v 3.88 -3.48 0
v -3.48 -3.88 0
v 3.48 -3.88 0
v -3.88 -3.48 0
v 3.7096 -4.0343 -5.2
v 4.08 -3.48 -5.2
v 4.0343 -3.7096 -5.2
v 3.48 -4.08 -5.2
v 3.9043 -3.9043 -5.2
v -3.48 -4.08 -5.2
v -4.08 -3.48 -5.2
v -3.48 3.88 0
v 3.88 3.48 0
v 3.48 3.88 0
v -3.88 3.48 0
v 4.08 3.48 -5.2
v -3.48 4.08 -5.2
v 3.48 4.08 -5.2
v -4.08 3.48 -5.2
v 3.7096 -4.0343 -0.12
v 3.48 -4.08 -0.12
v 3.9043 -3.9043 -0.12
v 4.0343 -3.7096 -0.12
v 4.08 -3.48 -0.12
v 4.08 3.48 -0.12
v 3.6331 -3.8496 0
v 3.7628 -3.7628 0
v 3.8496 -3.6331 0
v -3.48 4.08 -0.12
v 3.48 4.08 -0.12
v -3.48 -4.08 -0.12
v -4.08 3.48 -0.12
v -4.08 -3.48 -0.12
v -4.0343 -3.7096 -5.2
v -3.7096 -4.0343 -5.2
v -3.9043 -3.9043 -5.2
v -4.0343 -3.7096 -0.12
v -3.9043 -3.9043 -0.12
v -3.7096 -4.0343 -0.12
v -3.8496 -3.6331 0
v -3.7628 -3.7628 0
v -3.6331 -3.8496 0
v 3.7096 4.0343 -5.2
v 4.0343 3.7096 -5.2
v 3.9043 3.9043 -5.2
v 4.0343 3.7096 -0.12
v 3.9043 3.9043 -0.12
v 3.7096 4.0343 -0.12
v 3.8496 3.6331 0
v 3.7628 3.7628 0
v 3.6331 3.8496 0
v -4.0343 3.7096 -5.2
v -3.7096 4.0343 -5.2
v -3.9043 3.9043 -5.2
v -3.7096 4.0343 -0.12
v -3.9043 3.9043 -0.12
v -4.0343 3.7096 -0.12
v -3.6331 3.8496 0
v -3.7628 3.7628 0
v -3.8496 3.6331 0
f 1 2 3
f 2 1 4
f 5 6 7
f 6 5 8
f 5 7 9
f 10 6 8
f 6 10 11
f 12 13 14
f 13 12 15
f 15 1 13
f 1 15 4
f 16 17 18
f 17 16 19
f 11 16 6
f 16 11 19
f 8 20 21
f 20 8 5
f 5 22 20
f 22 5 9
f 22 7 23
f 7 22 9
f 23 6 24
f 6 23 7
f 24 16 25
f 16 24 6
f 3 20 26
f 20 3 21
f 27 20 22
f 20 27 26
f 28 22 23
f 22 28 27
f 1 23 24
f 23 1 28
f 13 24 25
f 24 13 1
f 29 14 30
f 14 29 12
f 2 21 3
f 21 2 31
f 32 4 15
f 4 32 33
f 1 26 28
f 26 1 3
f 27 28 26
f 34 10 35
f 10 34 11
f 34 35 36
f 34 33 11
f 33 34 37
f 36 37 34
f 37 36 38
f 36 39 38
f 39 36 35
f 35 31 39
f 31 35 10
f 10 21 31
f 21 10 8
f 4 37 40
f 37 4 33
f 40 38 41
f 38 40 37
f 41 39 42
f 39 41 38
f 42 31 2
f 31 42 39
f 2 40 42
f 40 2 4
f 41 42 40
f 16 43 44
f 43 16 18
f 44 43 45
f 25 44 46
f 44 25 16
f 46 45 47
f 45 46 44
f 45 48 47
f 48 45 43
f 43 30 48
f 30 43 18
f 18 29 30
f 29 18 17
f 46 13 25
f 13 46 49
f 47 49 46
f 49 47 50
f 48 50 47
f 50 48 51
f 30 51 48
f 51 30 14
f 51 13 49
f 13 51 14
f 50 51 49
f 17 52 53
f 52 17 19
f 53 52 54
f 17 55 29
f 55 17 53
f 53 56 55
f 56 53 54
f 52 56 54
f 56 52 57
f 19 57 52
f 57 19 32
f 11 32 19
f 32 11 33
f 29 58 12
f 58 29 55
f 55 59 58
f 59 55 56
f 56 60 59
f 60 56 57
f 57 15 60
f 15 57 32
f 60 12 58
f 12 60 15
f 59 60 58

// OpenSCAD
// file: ../p/1-4cyli.scad
use <../lib.scad>
function ldraw_lib__1_4cyli() = [
// 0 Cylinder 0.25
// 0 Name: 1-4cyli.dat
// 0 Author: James Jessiman
// 0 !LDRAW_ORG Primitive UPDATE 2012-01
// 0 !LICENSE Licensed under CC BY 4.0 : see CAreadme.txt
// 
// 0 BFC CERTIFY CCW
  [0,"BFC","CERTIFY"],
  [0,"BFC","CCW"],
// 
// 0 !HISTORY 2002-03-23 [sbliss] Added BFC statement.
// 0 !HISTORY 2002-04-25 [PTadmin] Official Update 2002-02
// 0 !HISTORY 2007-06-22 [PTadmin] Header formatted for Contributor Agreement
// 0 !HISTORY 2008-07-01 [PTadmin] Official Update 2008-01
// 0 !HISTORY 2012-02-16 [Philo] Changed to CCW
// 0 !HISTORY 2012-03-30 [PTadmin] Official Update 2012-01
// 
// 
// 4 16 1 1 0 0.9239 1 0.3827 0.9239 0 0.3827 1 0 0
  [4,16,1,1,0,0.9239,1,0.3827,0.9239,0,0.3827,1,0,0],
// 5 24 1 0 0 1 1 0 0.9239 0 0.3827 1 0 -1
  [5,24,1,0,0,1,1,0,0.9239,0,0.3827,1,0,-1],
// 4 16 0.9239 1 0.3827 0.7071 1 0.7071 0.7071 0 0.7071 0.9239 0 0.3827
  [4,16,0.9239,1,0.3827,0.7071,1,0.7071,0.7071,0,0.7071,0.9239,0,0.3827],
// 5 24 0.9239 0 0.3827 0.9239 1 0.3827 0.7071 0 0.7071 1 0 0
  [5,24,0.9239,0,0.3827,0.9239,1,0.3827,0.7071,0,0.7071,1,0,0],
// 4 16 0.7071 1 0.7071 0.3827 1 0.9239 0.3827 0 0.9239 0.7071 0 0.7071
  [4,16,0.7071,1,0.7071,0.3827,1,0.9239,0.3827,0,0.9239,0.7071,0,0.7071],
// 5 24 0.7071 0 0.7071 0.7071 1 0.7071 0.3827 0 0.9239 0.9239 0 0.3827
  [5,24,0.7071,0,0.7071,0.7071,1,0.7071,0.3827,0,0.9239,0.9239,0,0.3827],
// 4 16 0.3827 1 0.9239 0 1 1 0 0 1 0.3827 0 0.9239
  [4,16,0.3827,1,0.9239,0,1,1,0,0,1,0.3827,0,0.9239],
// 5 24 0.3827 0 0.9239 0.3827 1 0.9239 0 0 1 0.7071 0 0.7071
  [5,24,0.3827,0,0.9239,0.3827,1,0.9239,0,0,1,0.7071,0,0.7071],
// 5 24 0 0 1 0 1 1 0.3827 0 0.9239 -1 0 1
  [5,24,0,0,1,0,1,1,0.3827,0,0.9239,-1,0,1],
];
module ldraw_lib__1_4cyli(step=0, col=false, unit=2/5, alt=false, line=0.2, solid=!$preview)
    makepoly(ldraw_lib__1_4cyli(), step=step, col=col, unit=unit, alt=alt, line=line, solid=solid);
ldraw_lib__1_4cyli(line=0.2);
// file: ../p/rect2p.scad
use <../lib.scad>
function ldraw_lib__rect2p() = [
// 0 Rectangle with 2 Parallel Edges
// 0 Name: rect2p.dat
// 0 Author: Donald Sutter [technog]
// 0 !LDRAW_ORG Primitive UPDATE 2010-01
// 0 !LICENSE Licensed under CC BY 4.0 : see CAreadme.txt
// 
// 0 BFC CERTIFY CCW
  [0,"BFC","CERTIFY"],
  [0,"BFC","CCW"],
// 
// 0 !HISTORY 2003-08-01 [PTadmin] Official Update 2003-02
// 0 !HISTORY 2007-06-24 [PTadmin] Header formatted for Contributor Agreement
// 0 !HISTORY 2008-07-01 [PTadmin] Official Update 2008-01
// 0 !HISTORY 2010-01-17 [mikeheide] changed winding to CCW
// 0 !HISTORY 2010-04-05 [PTadmin] Official Update 2010-01
// 
// 
// 2 24 1 0 1 -1 0 1
  [2,24,1,0,1,-1,0,1],
// 2 24 -1 0 -1 1 0 -1
  [2,24,-1,0,-1,1,0,-1],
// 4 16 -1 0 1 -1 0 -1 1 0 -1 1 0 1
  [4,16,-1,0,1,-1,0,-1,1,0,-1,1,0,1],
// 0
];
module ldraw_lib__rect2p(step=0, col=false, unit=2/5, alt=false, line=0.2, solid=!$preview)
    makepoly(ldraw_lib__rect2p(), step=step, col=col, unit=unit, alt=alt, line=line, solid=solid);
ldraw_lib__rect2p(line=0.2);
// file: ../p/rect1.scad
use <../lib.scad>
function ldraw_lib__rect1() = [
// 0 Rectangle with 1 Edge
// 0 Name: rect1.dat
// 0 Author: Chris Dee [cwdee]
// 0 !LDRAW_ORG Primitive UPDATE 2010-01
// 0 !LICENSE Licensed under CC BY 4.0 : see CAreadme.txt
// 
// 0 BFC CERTIFY CCW
  [0,"BFC","CERTIFY"],
  [0,"BFC","CCW"],
// 
// 0 !HISTORY 2003-12-19 [PTadmin] Official Update 2003-03
// 0 !HISTORY 2007-06-24 [PTadmin] Header formatted for Contributor Agreement
// 0 !HISTORY 2008-07-01 [PTadmin] Official Update 2008-01
// 0 !HISTORY 2010-01-17 [mikeheide] changed winding to CCW
// 0 !HISTORY 2010-04-05 [PTadmin] Official Update 2010-01
// 
// 
// 2 24 1 0 -1 1 0 1
  [2,24,1,0,-1,1,0,1],
// 4 16 -1 0 1 -1 0 -1 1 0 -1 1 0 1
  [4,16,-1,0,1,-1,0,-1,1,0,-1,1,0,1],
// 0
];
module ldraw_lib__rect1(step=0, col=false, unit=2/5, alt=false, line=0.2, solid=!$preview)
    makepoly(ldraw_lib__rect1(), step=step, col=col, unit=unit, alt=alt, line=line, solid=solid);
ldraw_lib__rect1(line=0.2);
// file: ../p/1-4edge.scad
use <../lib.scad>
function ldraw_lib__1_4edge() = [
// 0 Circle 0.25
// 0 Name: 1-4edge.dat
// 0 Author: James Jessiman
// 0 !LDRAW_ORG Primitive UPDATE 2017-01
// 0 !LICENSE Licensed under CC BY 4.0 : see CAreadme.txt
// 
// 0 BFC CERTIFY CCW
  [0,"BFC","CERTIFY"],
  [0,"BFC","CCW"],
// 
// 0 !HISTORY 2007-06-22 [PTadmin] Header formatted for Contributor Agreement
// 0 !HISTORY 2008-07-01 [PTadmin] Official Update 2008-01
// 0 !HISTORY 2017-01-15 [Steffen] BFCed
// 0 !HISTORY 2017-12-30 [PTadmin] Official Update 2017-01
// 
// 
// 2 24 1 0 0 0.9239 0 0.3827
  [2,24,1,0,0,0.9239,0,0.3827],
// 2 24 0.9239 0 0.3827 0.7071 0 0.7071
  [2,24,0.9239,0,0.3827,0.7071,0,0.7071],
// 2 24 0.7071 0 0.7071 0.3827 0 0.9239
  [2,24,0.7071,0,0.7071,0.3827,0,0.9239],
// 2 24 0.3827 0 0.9239 0 0 1
  [2,24,0.3827,0,0.9239,0,0,1],
];
module ldraw_lib__1_4edge(step=0, col=false, unit=2/5, alt=false, line=0.2, solid=!$preview)
    makepoly(ldraw_lib__1_4edge(), step=step, col=col, unit=unit, alt=alt, line=line, solid=solid);
ldraw_lib__1_4edge(line=0.2);
// file: ../p/1-4cylo.scad
use <../lib.scad>
use <1-4cyli.scad>
use <1-4edge.scad>
function ldraw_lib__1_4cylo() = [
// 0 Cylinder Open 0.25
// 0 Name: 1-4cylo.dat
// 0 Author: Max Martin Richter [MMR1988]
// 0 !LDRAW_ORG Primitive UPDATE 2010-03
// 0 !LICENSE Licensed under CC BY 4.0 : see CAreadme.txt
// 
// 0 BFC CERTIFY CCW
  [0,"BFC","CERTIFY"],
  [0,"BFC","CCW"],
// 
// 0 !HISTORY 2010-12-31 [PTadmin] Official Update 2010-03
// 
// 
// 1 16 0 0 0 1 0 0 0 1 0 0 0 1 1-4edge.dat
  [1,16,0,0,0,1,0,0,0,1,0,0,0,1, ldraw_lib__1_4edge()],
// 1 16 0 1 0 1 0 0 0 1 0 0 0 1 1-4edge.dat
  [1,16,0,1,0,1,0,0,0,1,0,0,0,1, ldraw_lib__1_4edge()],
// 1 16 0 0 0 1 0 0 0 1 0 0 0 1 1-4cyli.dat
  [1,16,0,0,0,1,0,0,0,1,0,0,0,1, ldraw_lib__1_4cyli()],
];
module ldraw_lib__1_4cylo(step=0, col=false, unit=2/5, alt=false, line=0.2, solid=!$preview)
    makepoly(ldraw_lib__1_4cylo(), step=step, col=col, unit=unit, alt=alt, line=line, solid=solid);
ldraw_lib__1_4cylo(line=0.2);
// file: ../p/1-4con2.scad
use <../lib.scad>
function ldraw_lib__1_4con2() = [
// 0 Cone  2 x 0.25
// 0 Name: 1-4con2.dat
// 0 Author: Steve Bliss [sbliss]
// 0 !LDRAW_ORG Primitive UPDATE 2012-01
// 0 !LICENSE Licensed under CC BY 4.0 : see CAreadme.txt
// 
// 0 BFC CERTIFY CCW
  [0,"BFC","CERTIFY"],
  [0,"BFC","CCW"],
// 
// 0 !HISTORY 1999-07-05 [PTadmin] Official Update 1999-05
// 0 !HISTORY 2002-12-11 [cwdee] Standardised title and made BFC compliant
// 0 !HISTORY 2003-06-28 [pneaster] Added missing conditional line
// 0 !HISTORY 2003-12-19 [PTadmin] Official Update 2003-03
// 0 !HISTORY 2007-06-22 [PTadmin] Header formatted for Contributor Agreement
// 0 !HISTORY 2008-07-01 [PTadmin] Official Update 2008-01
// 0 !HISTORY 2012-02-16 [Philo] Recreated CCW
// 0 !HISTORY 2012-03-30 [PTadmin] Official Update 2012-01
// 
// 
// 4 16 2 1 0 1.8478 1 0.7654 2.7717 0 1.1481 3 0 0
  [4,16,2,1,0,1.8478,1,0.7654,2.7717,0,1.1481,3,0,0],
// 4 16 1.8478 1 0.7654 1.4142 1 1.4142 2.1213 0 2.1213 2.7717 0 1.1481
  [4,16,1.8478,1,0.7654,1.4142,1,1.4142,2.1213,0,2.1213,2.7717,0,1.1481],
// 4 16 1.4142 1 1.4142 0.7654 1 1.8478 1.1481 0 2.7717 2.1213 0 2.1213
  [4,16,1.4142,1,1.4142,0.7654,1,1.8478,1.1481,0,2.7717,2.1213,0,2.1213],
// 4 16 0.7654 1 1.8478 0 1 2 0 0 3 1.1481 0 2.7717
  [4,16,0.7654,1,1.8478,0,1,2,0,0,3,1.1481,0,2.7717],
// 0 // conditional lines
// 5 24 2 1 0 3 0 0 2 1 -0.8284 1.8478 1 0.7654
  [5,24,2,1,0,3,0,0,2,1,-0.8284,1.8478,1,0.7654],
// 5 24 1.8478 1 0.7654 2.7717 0 1.1481 2 1 0 1.4142 1 1.4142
  [5,24,1.8478,1,0.7654,2.7717,0,1.1481,2,1,0,1.4142,1,1.4142],
// 5 24 1.4142 1 1.4142 2.1213 0 2.1213 1.8478 1 0.7654 0.7654 1 1.8478
  [5,24,1.4142,1,1.4142,2.1213,0,2.1213,1.8478,1,0.7654,0.7654,1,1.8478],
// 5 24 0.7654 1 1.8478 1.1481 0 2.7717 1.4142 1 1.4142 0 1 2
  [5,24,0.7654,1,1.8478,1.1481,0,2.7717,1.4142,1,1.4142,0,1,2],
// 5 24 0 1 2 0 0 3 0.7654 1 1.8478 -0.8284 1 2
  [5,24,0,1,2,0,0,3,0.7654,1,1.8478,-0.8284,1,2],
// 0 // Build by Primitive Generator 2
];
module ldraw_lib__1_4con2(step=0, col=false, unit=2/5, alt=false, line=0.2, solid=!$preview)
    makepoly(ldraw_lib__1_4con2(), step=step, col=col, unit=unit, alt=alt, line=line, solid=solid);
ldraw_lib__1_4con2(line=0.2);
// file: ../p/1-4chrd.scad
use <../lib.scad>
function ldraw_lib__1_4chrd() = [
// 0 Chord 0.25
// 0 Name: 1-4chrd.dat
// 0 Author: Tony Hafner [hafhead]
// 0 !LDRAW_ORG Primitive UPDATE 2012-02
// 0 !LICENSE Licensed under CC BY 2.0 and CC BY 4.0 : see CAreadme.txt
// 
// 0 BFC CERTIFY CCW
  [0,"BFC","CERTIFY"],
  [0,"BFC","CCW"],
// 
// 0 !HISTORY 2004-04-22 [PTadmin] Official Update 2004-02
// 0 !HISTORY 2007-10-09 [PTadmin] Header formatted for Contributor Agreement
// 0 !HISTORY 2008-07-01 [PTadmin] Official Update 2008-01
// 0 !HISTORY 2012-08-02 [MMR1988] Re-creation with PrimGen2 and Rectifier
// 0 !HISTORY 2012-08-09 [PTadmin] Official Update 2012-02
// 
// 
// 4 16 0.9239 0 0.3827 0.3827 0 0.9239 0 0 1 1 0 0
  [4,16,0.9239,0,0.3827,0.3827,0,0.9239,0,0,1,1,0,0],
// 3 16 0.7071 0 0.7071 0.3827 0 0.9239 0.9239 0 0.3827
  [3,16,0.7071,0,0.7071,0.3827,0,0.9239,0.9239,0,0.3827],
];
module ldraw_lib__1_4chrd(step=0, col=false, unit=2/5, alt=false, line=0.2, solid=!$preview)
    makepoly(ldraw_lib__1_4chrd(), step=step, col=col, unit=unit, alt=alt, line=line, solid=solid);
ldraw_lib__1_4chrd(line=0.2);
// file: 99146.scad
use <../lib.scad>
use <../p/1-4chrd.scad>
use <../p/1-4con2.scad>
use <../p/1-4cylo.scad>
use <../p/1-4edge.scad>
use <../p/rect1.scad>
use <../p/rect2p.scad>
function ldraw_lib__99146() = [
// 0 ~Electric Mindstorms EV3 Square Button
// 0 Name: 99146.dat
// 0 Author: Philippe Hurbain [Philo]
// 0 !LDRAW_ORG Part UPDATE 2013-02
// 0 !LICENSE Licensed under CC BY 4.0 : see CAreadme.txt
// 
// 0 BFC CERTIFY CCW
  [0,"BFC","CERTIFY"],
  [0,"BFC","CCW"],
// 
// 0 !HISTORY 2012-05-20 {LEGO MINDSTORMS Team} Original part shape
// 0 !HISTORY 2012-06-09 [Philo] Complete rebuild for LDraw Parts Tracker
// 0 !HISTORY 2013-12-23 [PTadmin] Official Update 2013-02
// 
// 
// 4 16 8.7 0 -9.7 9.7 0 -8.7 -9.7 0 -8.7 -8.7 0 -9.7
  [4,16,8.7,0,-9.7,9.7,0,-8.7,-9.7,0,-8.7,-8.7,0,-9.7],
// 1 16 8.7 13 -8.7 0 0 1.5 0 -0.3 0 -1.5 0 0 1-4chrd.dat
  [1,16,8.7,13,-8.7,0,0,1.5,0,-0.3,0,-1.5,0,0, ldraw_lib__1_4chrd()],
// 4 16 -8.7 13 -10.2 -10.2 13 -8.7 10.2 13 -8.7 8.7 13 -10.2
  [4,16,-8.7,13,-10.2,-10.2,13,-8.7,10.2,13,-8.7,8.7,13,-10.2],
// 4 16 -8.7 0 9.7 -9.7 0 8.7 9.7 0 8.7 8.7 0 9.7
  [4,16,-8.7,0,9.7,-9.7,0,8.7,9.7,0,8.7,8.7,0,9.7],
// 1 16 0 0 0 0 0 -9.7 0 1 0 8.7 0 0 rect2p.dat
  [1,16,0,0,0,0,0,-9.7,0,1,0,8.7,0,0, ldraw_lib__rect2p()],
// 4 16 8.7 13 10.2 10.2 13 8.7 -10.2 13 8.7 -8.7 13 10.2
  [4,16,8.7,13,10.2,10.2,13,8.7,-10.2,13,8.7,-8.7,13,10.2],
// 4 16 -10.2 13 -8.7 -10.2 13 8.7 10.2 13 8.7 10.2 13 -8.7
  [4,16,-10.2,13,-8.7,-10.2,13,8.7,10.2,13,8.7,10.2,13,-8.7],
// 1 16 8.7 0.3 -8.7 0 0 1.5 0 12.7 0 -1.5 0 0 1-4cylo.dat
  [1,16,8.7,0.3,-8.7,0,0,1.5,0,12.7,0,-1.5,0,0, ldraw_lib__1_4cylo()],
// 1 16 10.2 6.65 0 0 -1 0 0 0 -6.35 8.7 0 0 rect2p.dat
  [1,16,10.2,6.65,0,0,-1,0,0,0,-6.35,8.7,0,0, ldraw_lib__rect2p()],
// 1 16 8.7 0.3 -8.7 0 0 0.5 0 -0.3 0 -0.5 0 0 1-4con2.dat
  [1,16,8.7,0.3,-8.7,0,0,0.5,0,-0.3,0,-0.5,0,0, ldraw_lib__1_4con2()],
// 1 16 8.7 0 -8.7 0 0 1 0 0.3 0 -1 0 0 1-4edge.dat
  [1,16,8.7,0,-8.7,0,0,1,0,0.3,0,-1,0,0, ldraw_lib__1_4edge()],
// 4 16 9.7 0 -8.7 10.2 0.3 -8.7 10.2 0.3 8.7 9.7 0 8.7
  [4,16,9.7,0,-8.7,10.2,0.3,-8.7,10.2,0.3,8.7,9.7,0,8.7],
// 1 16 0 0.15 9.95 0 0 8.7 -0.15 8.7 0 -0.25 -5.22 0 rect1.dat
  [1,16,0,0.15,9.95,0,0,8.7,-0.15,8.7,0,-0.25,-5.22,0, ldraw_lib__rect1()],
// 1 16 0 0.15 -9.95 0 0 -8.7 -0.15 8.7 0 0.25 5.22 0 rect1.dat
  [1,16,0,0.15,-9.95,0,0,-8.7,-0.15,8.7,0,0.25,5.22,0, ldraw_lib__rect1()],
// 4 16 -9.7 0 8.7 -10.2 0.3 8.7 -10.2 0.3 -8.7 -9.7 0 -8.7
  [4,16,-9.7,0,8.7,-10.2,0.3,8.7,-10.2,0.3,-8.7,-9.7,0,-8.7],
// 1 16 8.7 0 -8.7 0 0 1 0 0.3 0 -1 0 0 1-4chrd.dat
  [1,16,8.7,0,-8.7,0,0,1,0,0.3,0,-1,0,0, ldraw_lib__1_4chrd()],
// 1 16 -8.7 13 -8.7 -1.5 0 0 0 -0.3 0 0 0 -1.5 1-4chrd.dat
  [1,16,-8.7,13,-8.7,-1.5,0,0,0,-0.3,0,0,0,-1.5, ldraw_lib__1_4chrd()],
// 1 16 -8.7 0.3 -8.7 -1.5 0 0 0 12.7 0 0 0 -1.5 1-4cylo.dat
  [1,16,-8.7,0.3,-8.7,-1.5,0,0,0,12.7,0,0,0,-1.5, ldraw_lib__1_4cylo()],
// 1 16 0 6.65 -10.2 8.7 0 0 0 0 -6.35 0 1 0 rect2p.dat
  [1,16,0,6.65,-10.2,8.7,0,0,0,0,-6.35,0,1,0, ldraw_lib__rect2p()],
// 1 16 -8.7 0.3 -8.7 -0.5 0 0 0 -0.3 0 0 0 -0.5 1-4con2.dat
  [1,16,-8.7,0.3,-8.7,-0.5,0,0,0,-0.3,0,0,0,-0.5, ldraw_lib__1_4con2()],
// 1 16 -8.7 0 -8.7 -1 0 0 0 0.3 0 0 0 -1 1-4edge.dat
  [1,16,-8.7,0,-8.7,-1,0,0,0,0.3,0,0,0,-1, ldraw_lib__1_4edge()],
// 1 16 -8.7 0 -8.7 -1 0 0 0 0.3 0 0 0 -1 1-4chrd.dat
  [1,16,-8.7,0,-8.7,-1,0,0,0,0.3,0,0,0,-1, ldraw_lib__1_4chrd()],
// 1 16 8.7 13 8.7 1.5 0 0 0 -0.3 0 0 0 1.5 1-4chrd.dat
  [1,16,8.7,13,8.7,1.5,0,0,0,-0.3,0,0,0,1.5, ldraw_lib__1_4chrd()],
// 1 16 8.7 0.3 8.7 1.5 0 0 0 12.7 0 0 0 1.5 1-4cylo.dat
  [1,16,8.7,0.3,8.7,1.5,0,0,0,12.7,0,0,0,1.5, ldraw_lib__1_4cylo()],
// 1 16 0 6.65 10.2 -8.7 0 0 0 0 -6.35 0 -1 0 rect2p.dat
  [1,16,0,6.65,10.2,-8.7,0,0,0,0,-6.35,0,-1,0, ldraw_lib__rect2p()],
// 1 16 8.7 0.3 8.7 0.5 0 0 0 -0.3 0 0 0 0.5 1-4con2.dat
  [1,16,8.7,0.3,8.7,0.5,0,0,0,-0.3,0,0,0,0.5, ldraw_lib__1_4con2()],
// 1 16 8.7 0 8.7 1 0 0 0 0.3 0 0 0 1 1-4edge.dat
  [1,16,8.7,0,8.7,1,0,0,0,0.3,0,0,0,1, ldraw_lib__1_4edge()],
// 1 16 8.7 0 8.7 1 0 0 0 0.3 0 0 0 1 1-4chrd.dat
  [1,16,8.7,0,8.7,1,0,0,0,0.3,0,0,0,1, ldraw_lib__1_4chrd()],
// 1 16 -8.7 13 8.7 0 0 -1.5 0 -0.3 0 1.5 0 0 1-4chrd.dat
  [1,16,-8.7,13,8.7,0,0,-1.5,0,-0.3,0,1.5,0,0, ldraw_lib__1_4chrd()],
// 1 16 -8.7 0.3 8.7 0 0 -1.5 0 12.7 0 1.5 0 0 1-4cylo.dat
  [1,16,-8.7,0.3,8.7,0,0,-1.5,0,12.7,0,1.5,0,0, ldraw_lib__1_4cylo()],
// 1 16 -10.2 6.65 0 0 1 0 0 0 -6.35 -8.7 0 0 rect2p.dat
  [1,16,-10.2,6.65,0,0,1,0,0,0,-6.35,-8.7,0,0, ldraw_lib__rect2p()],
// 1 16 -8.7 0.3 8.7 0 0 -0.5 0 -0.3 0 0.5 0 0 1-4con2.dat
  [1,16,-8.7,0.3,8.7,0,0,-0.5,0,-0.3,0,0.5,0,0, ldraw_lib__1_4con2()],
// 1 16 -8.7 0 8.7 0 0 -1 0 0.3 0 1 0 0 1-4edge.dat
  [1,16,-8.7,0,8.7,0,0,-1,0,0.3,0,1,0,0, ldraw_lib__1_4edge()],
// 1 16 -8.7 0 8.7 0 0 -1 0 0.3 0 1 0 0 1-4chrd.dat
  [1,16,-8.7,0,8.7,0,0,-1,0,0.3,0,1,0,0, ldraw_lib__1_4chrd()],
];
module ldraw_lib__99146(step=0, col=false, unit=2/5, alt=false, line=0.2, solid=!$preview)
    makepoly(ldraw_lib__99146(), step=step, col=col, unit=unit, alt=alt, line=line, solid=solid);
ldraw_lib__99146(line=0.2);
// main file
use <../lib.scad>
use <99146.scad>
function ldraw_lib__27198() = [
// 0 ~Electric Power Functions 2.0 Boost Move Hub Button
// 0 Name: 27198.dat
// 0 Author: Philippe Hurbain [Philo]
// 0 !LDRAW_ORG Part UPDATE 2019-01
// 0 !LICENSE Licensed under CC BY 4.0 : see CAreadme.txt
// 
// 0 BFC CERTIFY CCW
  [0,"BFC","CERTIFY"],
  [0,"BFC","CCW"],
// 
// 0 !HISTORY 2019-06-28 [PTadmin] Official Update 2019-01
// 
// 
// 1 16 0 0 0 1 0 0 0 1 0 0 0 1 99146.dat
  [1,16,0,0,0,1,0,0,0,1,0,0,0,1, ldraw_lib__99146()],
];
module ldraw_lib__27198(step=0, col=false, unit=2/5, alt=false, line=0.2, solid=!$preview)
    makepoly(ldraw_lib__27198(), step=step, col=col, unit=unit, alt=alt, line=line, solid=solid);
ldraw_lib__27198(line=0.2);
